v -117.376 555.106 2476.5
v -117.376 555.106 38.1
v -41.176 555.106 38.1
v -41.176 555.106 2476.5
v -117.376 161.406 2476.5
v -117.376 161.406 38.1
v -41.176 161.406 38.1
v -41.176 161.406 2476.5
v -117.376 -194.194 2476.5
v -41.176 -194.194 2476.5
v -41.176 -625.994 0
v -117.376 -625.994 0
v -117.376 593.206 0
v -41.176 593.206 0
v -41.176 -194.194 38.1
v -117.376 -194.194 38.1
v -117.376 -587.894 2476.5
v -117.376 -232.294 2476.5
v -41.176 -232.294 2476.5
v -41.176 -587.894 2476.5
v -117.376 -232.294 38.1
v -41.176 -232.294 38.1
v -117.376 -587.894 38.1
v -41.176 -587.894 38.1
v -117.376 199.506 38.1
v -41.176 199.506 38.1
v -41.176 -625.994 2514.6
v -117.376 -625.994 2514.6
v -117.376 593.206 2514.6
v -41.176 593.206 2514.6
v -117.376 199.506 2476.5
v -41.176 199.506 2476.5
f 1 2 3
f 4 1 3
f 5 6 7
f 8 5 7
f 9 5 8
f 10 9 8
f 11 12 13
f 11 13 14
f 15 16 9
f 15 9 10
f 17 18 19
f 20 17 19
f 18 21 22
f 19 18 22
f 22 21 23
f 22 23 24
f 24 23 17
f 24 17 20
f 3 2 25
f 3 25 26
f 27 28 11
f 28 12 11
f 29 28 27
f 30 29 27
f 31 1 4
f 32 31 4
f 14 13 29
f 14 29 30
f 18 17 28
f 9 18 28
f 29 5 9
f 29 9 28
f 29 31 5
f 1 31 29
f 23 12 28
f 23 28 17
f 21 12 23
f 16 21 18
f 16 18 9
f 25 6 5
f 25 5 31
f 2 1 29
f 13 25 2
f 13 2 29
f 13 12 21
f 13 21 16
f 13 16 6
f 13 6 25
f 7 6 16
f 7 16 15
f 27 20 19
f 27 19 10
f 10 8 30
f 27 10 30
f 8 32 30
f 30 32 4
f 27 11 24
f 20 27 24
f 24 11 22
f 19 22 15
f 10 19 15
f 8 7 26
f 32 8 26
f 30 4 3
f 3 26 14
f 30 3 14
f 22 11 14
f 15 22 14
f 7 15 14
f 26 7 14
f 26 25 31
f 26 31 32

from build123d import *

# Parameters (mm, degrees)
F0_W     = 76.2
F0_H     = 1219.2
F1_DEPTH = 38.1
F2_W     = 76.2
F2_H     = 38.1
F3_DEPTH = 2438.4
F4_START = 2476.5
F4_DEPTH = 38.1


with BuildPart() as f1:
    # F0 (on Top) → F1 (new body)
    with BuildSketch(Plane.XY):
        with Locations((-79.2764335848, -16.3942715153)):
            Rectangle(F0_W, F0_H)
    extrude(amount=F1_DEPTH)

    # F2 (on face) → F3 (join)
    with BuildSketch(Plane.XY.offset(38.1)):
        with Locations((-79.2764335848, -606.9442715153)):
            Rectangle(F2_W, F2_H)
        with Locations((-79.2764335848, 574.1557284847)):
            Rectangle(F2_W, F2_H)
        with Locations((-79.2764335848, 180.4557284847)):
            Rectangle(F2_W, F2_H)
        with Locations((-79.2764335848, -213.2442715153)):
            Rectangle(F2_W, F2_H)
    extrude(amount=F3_DEPTH)

    # F0 (on Top) → F4 (join)
    with BuildSketch(Plane.XY.offset(F4_START)):
        with Locations((-79.2764335848, -16.3942715153)):
            Rectangle(F0_W, F0_H)
    extrude(amount=F4_DEPTH)


solid = f1.part
